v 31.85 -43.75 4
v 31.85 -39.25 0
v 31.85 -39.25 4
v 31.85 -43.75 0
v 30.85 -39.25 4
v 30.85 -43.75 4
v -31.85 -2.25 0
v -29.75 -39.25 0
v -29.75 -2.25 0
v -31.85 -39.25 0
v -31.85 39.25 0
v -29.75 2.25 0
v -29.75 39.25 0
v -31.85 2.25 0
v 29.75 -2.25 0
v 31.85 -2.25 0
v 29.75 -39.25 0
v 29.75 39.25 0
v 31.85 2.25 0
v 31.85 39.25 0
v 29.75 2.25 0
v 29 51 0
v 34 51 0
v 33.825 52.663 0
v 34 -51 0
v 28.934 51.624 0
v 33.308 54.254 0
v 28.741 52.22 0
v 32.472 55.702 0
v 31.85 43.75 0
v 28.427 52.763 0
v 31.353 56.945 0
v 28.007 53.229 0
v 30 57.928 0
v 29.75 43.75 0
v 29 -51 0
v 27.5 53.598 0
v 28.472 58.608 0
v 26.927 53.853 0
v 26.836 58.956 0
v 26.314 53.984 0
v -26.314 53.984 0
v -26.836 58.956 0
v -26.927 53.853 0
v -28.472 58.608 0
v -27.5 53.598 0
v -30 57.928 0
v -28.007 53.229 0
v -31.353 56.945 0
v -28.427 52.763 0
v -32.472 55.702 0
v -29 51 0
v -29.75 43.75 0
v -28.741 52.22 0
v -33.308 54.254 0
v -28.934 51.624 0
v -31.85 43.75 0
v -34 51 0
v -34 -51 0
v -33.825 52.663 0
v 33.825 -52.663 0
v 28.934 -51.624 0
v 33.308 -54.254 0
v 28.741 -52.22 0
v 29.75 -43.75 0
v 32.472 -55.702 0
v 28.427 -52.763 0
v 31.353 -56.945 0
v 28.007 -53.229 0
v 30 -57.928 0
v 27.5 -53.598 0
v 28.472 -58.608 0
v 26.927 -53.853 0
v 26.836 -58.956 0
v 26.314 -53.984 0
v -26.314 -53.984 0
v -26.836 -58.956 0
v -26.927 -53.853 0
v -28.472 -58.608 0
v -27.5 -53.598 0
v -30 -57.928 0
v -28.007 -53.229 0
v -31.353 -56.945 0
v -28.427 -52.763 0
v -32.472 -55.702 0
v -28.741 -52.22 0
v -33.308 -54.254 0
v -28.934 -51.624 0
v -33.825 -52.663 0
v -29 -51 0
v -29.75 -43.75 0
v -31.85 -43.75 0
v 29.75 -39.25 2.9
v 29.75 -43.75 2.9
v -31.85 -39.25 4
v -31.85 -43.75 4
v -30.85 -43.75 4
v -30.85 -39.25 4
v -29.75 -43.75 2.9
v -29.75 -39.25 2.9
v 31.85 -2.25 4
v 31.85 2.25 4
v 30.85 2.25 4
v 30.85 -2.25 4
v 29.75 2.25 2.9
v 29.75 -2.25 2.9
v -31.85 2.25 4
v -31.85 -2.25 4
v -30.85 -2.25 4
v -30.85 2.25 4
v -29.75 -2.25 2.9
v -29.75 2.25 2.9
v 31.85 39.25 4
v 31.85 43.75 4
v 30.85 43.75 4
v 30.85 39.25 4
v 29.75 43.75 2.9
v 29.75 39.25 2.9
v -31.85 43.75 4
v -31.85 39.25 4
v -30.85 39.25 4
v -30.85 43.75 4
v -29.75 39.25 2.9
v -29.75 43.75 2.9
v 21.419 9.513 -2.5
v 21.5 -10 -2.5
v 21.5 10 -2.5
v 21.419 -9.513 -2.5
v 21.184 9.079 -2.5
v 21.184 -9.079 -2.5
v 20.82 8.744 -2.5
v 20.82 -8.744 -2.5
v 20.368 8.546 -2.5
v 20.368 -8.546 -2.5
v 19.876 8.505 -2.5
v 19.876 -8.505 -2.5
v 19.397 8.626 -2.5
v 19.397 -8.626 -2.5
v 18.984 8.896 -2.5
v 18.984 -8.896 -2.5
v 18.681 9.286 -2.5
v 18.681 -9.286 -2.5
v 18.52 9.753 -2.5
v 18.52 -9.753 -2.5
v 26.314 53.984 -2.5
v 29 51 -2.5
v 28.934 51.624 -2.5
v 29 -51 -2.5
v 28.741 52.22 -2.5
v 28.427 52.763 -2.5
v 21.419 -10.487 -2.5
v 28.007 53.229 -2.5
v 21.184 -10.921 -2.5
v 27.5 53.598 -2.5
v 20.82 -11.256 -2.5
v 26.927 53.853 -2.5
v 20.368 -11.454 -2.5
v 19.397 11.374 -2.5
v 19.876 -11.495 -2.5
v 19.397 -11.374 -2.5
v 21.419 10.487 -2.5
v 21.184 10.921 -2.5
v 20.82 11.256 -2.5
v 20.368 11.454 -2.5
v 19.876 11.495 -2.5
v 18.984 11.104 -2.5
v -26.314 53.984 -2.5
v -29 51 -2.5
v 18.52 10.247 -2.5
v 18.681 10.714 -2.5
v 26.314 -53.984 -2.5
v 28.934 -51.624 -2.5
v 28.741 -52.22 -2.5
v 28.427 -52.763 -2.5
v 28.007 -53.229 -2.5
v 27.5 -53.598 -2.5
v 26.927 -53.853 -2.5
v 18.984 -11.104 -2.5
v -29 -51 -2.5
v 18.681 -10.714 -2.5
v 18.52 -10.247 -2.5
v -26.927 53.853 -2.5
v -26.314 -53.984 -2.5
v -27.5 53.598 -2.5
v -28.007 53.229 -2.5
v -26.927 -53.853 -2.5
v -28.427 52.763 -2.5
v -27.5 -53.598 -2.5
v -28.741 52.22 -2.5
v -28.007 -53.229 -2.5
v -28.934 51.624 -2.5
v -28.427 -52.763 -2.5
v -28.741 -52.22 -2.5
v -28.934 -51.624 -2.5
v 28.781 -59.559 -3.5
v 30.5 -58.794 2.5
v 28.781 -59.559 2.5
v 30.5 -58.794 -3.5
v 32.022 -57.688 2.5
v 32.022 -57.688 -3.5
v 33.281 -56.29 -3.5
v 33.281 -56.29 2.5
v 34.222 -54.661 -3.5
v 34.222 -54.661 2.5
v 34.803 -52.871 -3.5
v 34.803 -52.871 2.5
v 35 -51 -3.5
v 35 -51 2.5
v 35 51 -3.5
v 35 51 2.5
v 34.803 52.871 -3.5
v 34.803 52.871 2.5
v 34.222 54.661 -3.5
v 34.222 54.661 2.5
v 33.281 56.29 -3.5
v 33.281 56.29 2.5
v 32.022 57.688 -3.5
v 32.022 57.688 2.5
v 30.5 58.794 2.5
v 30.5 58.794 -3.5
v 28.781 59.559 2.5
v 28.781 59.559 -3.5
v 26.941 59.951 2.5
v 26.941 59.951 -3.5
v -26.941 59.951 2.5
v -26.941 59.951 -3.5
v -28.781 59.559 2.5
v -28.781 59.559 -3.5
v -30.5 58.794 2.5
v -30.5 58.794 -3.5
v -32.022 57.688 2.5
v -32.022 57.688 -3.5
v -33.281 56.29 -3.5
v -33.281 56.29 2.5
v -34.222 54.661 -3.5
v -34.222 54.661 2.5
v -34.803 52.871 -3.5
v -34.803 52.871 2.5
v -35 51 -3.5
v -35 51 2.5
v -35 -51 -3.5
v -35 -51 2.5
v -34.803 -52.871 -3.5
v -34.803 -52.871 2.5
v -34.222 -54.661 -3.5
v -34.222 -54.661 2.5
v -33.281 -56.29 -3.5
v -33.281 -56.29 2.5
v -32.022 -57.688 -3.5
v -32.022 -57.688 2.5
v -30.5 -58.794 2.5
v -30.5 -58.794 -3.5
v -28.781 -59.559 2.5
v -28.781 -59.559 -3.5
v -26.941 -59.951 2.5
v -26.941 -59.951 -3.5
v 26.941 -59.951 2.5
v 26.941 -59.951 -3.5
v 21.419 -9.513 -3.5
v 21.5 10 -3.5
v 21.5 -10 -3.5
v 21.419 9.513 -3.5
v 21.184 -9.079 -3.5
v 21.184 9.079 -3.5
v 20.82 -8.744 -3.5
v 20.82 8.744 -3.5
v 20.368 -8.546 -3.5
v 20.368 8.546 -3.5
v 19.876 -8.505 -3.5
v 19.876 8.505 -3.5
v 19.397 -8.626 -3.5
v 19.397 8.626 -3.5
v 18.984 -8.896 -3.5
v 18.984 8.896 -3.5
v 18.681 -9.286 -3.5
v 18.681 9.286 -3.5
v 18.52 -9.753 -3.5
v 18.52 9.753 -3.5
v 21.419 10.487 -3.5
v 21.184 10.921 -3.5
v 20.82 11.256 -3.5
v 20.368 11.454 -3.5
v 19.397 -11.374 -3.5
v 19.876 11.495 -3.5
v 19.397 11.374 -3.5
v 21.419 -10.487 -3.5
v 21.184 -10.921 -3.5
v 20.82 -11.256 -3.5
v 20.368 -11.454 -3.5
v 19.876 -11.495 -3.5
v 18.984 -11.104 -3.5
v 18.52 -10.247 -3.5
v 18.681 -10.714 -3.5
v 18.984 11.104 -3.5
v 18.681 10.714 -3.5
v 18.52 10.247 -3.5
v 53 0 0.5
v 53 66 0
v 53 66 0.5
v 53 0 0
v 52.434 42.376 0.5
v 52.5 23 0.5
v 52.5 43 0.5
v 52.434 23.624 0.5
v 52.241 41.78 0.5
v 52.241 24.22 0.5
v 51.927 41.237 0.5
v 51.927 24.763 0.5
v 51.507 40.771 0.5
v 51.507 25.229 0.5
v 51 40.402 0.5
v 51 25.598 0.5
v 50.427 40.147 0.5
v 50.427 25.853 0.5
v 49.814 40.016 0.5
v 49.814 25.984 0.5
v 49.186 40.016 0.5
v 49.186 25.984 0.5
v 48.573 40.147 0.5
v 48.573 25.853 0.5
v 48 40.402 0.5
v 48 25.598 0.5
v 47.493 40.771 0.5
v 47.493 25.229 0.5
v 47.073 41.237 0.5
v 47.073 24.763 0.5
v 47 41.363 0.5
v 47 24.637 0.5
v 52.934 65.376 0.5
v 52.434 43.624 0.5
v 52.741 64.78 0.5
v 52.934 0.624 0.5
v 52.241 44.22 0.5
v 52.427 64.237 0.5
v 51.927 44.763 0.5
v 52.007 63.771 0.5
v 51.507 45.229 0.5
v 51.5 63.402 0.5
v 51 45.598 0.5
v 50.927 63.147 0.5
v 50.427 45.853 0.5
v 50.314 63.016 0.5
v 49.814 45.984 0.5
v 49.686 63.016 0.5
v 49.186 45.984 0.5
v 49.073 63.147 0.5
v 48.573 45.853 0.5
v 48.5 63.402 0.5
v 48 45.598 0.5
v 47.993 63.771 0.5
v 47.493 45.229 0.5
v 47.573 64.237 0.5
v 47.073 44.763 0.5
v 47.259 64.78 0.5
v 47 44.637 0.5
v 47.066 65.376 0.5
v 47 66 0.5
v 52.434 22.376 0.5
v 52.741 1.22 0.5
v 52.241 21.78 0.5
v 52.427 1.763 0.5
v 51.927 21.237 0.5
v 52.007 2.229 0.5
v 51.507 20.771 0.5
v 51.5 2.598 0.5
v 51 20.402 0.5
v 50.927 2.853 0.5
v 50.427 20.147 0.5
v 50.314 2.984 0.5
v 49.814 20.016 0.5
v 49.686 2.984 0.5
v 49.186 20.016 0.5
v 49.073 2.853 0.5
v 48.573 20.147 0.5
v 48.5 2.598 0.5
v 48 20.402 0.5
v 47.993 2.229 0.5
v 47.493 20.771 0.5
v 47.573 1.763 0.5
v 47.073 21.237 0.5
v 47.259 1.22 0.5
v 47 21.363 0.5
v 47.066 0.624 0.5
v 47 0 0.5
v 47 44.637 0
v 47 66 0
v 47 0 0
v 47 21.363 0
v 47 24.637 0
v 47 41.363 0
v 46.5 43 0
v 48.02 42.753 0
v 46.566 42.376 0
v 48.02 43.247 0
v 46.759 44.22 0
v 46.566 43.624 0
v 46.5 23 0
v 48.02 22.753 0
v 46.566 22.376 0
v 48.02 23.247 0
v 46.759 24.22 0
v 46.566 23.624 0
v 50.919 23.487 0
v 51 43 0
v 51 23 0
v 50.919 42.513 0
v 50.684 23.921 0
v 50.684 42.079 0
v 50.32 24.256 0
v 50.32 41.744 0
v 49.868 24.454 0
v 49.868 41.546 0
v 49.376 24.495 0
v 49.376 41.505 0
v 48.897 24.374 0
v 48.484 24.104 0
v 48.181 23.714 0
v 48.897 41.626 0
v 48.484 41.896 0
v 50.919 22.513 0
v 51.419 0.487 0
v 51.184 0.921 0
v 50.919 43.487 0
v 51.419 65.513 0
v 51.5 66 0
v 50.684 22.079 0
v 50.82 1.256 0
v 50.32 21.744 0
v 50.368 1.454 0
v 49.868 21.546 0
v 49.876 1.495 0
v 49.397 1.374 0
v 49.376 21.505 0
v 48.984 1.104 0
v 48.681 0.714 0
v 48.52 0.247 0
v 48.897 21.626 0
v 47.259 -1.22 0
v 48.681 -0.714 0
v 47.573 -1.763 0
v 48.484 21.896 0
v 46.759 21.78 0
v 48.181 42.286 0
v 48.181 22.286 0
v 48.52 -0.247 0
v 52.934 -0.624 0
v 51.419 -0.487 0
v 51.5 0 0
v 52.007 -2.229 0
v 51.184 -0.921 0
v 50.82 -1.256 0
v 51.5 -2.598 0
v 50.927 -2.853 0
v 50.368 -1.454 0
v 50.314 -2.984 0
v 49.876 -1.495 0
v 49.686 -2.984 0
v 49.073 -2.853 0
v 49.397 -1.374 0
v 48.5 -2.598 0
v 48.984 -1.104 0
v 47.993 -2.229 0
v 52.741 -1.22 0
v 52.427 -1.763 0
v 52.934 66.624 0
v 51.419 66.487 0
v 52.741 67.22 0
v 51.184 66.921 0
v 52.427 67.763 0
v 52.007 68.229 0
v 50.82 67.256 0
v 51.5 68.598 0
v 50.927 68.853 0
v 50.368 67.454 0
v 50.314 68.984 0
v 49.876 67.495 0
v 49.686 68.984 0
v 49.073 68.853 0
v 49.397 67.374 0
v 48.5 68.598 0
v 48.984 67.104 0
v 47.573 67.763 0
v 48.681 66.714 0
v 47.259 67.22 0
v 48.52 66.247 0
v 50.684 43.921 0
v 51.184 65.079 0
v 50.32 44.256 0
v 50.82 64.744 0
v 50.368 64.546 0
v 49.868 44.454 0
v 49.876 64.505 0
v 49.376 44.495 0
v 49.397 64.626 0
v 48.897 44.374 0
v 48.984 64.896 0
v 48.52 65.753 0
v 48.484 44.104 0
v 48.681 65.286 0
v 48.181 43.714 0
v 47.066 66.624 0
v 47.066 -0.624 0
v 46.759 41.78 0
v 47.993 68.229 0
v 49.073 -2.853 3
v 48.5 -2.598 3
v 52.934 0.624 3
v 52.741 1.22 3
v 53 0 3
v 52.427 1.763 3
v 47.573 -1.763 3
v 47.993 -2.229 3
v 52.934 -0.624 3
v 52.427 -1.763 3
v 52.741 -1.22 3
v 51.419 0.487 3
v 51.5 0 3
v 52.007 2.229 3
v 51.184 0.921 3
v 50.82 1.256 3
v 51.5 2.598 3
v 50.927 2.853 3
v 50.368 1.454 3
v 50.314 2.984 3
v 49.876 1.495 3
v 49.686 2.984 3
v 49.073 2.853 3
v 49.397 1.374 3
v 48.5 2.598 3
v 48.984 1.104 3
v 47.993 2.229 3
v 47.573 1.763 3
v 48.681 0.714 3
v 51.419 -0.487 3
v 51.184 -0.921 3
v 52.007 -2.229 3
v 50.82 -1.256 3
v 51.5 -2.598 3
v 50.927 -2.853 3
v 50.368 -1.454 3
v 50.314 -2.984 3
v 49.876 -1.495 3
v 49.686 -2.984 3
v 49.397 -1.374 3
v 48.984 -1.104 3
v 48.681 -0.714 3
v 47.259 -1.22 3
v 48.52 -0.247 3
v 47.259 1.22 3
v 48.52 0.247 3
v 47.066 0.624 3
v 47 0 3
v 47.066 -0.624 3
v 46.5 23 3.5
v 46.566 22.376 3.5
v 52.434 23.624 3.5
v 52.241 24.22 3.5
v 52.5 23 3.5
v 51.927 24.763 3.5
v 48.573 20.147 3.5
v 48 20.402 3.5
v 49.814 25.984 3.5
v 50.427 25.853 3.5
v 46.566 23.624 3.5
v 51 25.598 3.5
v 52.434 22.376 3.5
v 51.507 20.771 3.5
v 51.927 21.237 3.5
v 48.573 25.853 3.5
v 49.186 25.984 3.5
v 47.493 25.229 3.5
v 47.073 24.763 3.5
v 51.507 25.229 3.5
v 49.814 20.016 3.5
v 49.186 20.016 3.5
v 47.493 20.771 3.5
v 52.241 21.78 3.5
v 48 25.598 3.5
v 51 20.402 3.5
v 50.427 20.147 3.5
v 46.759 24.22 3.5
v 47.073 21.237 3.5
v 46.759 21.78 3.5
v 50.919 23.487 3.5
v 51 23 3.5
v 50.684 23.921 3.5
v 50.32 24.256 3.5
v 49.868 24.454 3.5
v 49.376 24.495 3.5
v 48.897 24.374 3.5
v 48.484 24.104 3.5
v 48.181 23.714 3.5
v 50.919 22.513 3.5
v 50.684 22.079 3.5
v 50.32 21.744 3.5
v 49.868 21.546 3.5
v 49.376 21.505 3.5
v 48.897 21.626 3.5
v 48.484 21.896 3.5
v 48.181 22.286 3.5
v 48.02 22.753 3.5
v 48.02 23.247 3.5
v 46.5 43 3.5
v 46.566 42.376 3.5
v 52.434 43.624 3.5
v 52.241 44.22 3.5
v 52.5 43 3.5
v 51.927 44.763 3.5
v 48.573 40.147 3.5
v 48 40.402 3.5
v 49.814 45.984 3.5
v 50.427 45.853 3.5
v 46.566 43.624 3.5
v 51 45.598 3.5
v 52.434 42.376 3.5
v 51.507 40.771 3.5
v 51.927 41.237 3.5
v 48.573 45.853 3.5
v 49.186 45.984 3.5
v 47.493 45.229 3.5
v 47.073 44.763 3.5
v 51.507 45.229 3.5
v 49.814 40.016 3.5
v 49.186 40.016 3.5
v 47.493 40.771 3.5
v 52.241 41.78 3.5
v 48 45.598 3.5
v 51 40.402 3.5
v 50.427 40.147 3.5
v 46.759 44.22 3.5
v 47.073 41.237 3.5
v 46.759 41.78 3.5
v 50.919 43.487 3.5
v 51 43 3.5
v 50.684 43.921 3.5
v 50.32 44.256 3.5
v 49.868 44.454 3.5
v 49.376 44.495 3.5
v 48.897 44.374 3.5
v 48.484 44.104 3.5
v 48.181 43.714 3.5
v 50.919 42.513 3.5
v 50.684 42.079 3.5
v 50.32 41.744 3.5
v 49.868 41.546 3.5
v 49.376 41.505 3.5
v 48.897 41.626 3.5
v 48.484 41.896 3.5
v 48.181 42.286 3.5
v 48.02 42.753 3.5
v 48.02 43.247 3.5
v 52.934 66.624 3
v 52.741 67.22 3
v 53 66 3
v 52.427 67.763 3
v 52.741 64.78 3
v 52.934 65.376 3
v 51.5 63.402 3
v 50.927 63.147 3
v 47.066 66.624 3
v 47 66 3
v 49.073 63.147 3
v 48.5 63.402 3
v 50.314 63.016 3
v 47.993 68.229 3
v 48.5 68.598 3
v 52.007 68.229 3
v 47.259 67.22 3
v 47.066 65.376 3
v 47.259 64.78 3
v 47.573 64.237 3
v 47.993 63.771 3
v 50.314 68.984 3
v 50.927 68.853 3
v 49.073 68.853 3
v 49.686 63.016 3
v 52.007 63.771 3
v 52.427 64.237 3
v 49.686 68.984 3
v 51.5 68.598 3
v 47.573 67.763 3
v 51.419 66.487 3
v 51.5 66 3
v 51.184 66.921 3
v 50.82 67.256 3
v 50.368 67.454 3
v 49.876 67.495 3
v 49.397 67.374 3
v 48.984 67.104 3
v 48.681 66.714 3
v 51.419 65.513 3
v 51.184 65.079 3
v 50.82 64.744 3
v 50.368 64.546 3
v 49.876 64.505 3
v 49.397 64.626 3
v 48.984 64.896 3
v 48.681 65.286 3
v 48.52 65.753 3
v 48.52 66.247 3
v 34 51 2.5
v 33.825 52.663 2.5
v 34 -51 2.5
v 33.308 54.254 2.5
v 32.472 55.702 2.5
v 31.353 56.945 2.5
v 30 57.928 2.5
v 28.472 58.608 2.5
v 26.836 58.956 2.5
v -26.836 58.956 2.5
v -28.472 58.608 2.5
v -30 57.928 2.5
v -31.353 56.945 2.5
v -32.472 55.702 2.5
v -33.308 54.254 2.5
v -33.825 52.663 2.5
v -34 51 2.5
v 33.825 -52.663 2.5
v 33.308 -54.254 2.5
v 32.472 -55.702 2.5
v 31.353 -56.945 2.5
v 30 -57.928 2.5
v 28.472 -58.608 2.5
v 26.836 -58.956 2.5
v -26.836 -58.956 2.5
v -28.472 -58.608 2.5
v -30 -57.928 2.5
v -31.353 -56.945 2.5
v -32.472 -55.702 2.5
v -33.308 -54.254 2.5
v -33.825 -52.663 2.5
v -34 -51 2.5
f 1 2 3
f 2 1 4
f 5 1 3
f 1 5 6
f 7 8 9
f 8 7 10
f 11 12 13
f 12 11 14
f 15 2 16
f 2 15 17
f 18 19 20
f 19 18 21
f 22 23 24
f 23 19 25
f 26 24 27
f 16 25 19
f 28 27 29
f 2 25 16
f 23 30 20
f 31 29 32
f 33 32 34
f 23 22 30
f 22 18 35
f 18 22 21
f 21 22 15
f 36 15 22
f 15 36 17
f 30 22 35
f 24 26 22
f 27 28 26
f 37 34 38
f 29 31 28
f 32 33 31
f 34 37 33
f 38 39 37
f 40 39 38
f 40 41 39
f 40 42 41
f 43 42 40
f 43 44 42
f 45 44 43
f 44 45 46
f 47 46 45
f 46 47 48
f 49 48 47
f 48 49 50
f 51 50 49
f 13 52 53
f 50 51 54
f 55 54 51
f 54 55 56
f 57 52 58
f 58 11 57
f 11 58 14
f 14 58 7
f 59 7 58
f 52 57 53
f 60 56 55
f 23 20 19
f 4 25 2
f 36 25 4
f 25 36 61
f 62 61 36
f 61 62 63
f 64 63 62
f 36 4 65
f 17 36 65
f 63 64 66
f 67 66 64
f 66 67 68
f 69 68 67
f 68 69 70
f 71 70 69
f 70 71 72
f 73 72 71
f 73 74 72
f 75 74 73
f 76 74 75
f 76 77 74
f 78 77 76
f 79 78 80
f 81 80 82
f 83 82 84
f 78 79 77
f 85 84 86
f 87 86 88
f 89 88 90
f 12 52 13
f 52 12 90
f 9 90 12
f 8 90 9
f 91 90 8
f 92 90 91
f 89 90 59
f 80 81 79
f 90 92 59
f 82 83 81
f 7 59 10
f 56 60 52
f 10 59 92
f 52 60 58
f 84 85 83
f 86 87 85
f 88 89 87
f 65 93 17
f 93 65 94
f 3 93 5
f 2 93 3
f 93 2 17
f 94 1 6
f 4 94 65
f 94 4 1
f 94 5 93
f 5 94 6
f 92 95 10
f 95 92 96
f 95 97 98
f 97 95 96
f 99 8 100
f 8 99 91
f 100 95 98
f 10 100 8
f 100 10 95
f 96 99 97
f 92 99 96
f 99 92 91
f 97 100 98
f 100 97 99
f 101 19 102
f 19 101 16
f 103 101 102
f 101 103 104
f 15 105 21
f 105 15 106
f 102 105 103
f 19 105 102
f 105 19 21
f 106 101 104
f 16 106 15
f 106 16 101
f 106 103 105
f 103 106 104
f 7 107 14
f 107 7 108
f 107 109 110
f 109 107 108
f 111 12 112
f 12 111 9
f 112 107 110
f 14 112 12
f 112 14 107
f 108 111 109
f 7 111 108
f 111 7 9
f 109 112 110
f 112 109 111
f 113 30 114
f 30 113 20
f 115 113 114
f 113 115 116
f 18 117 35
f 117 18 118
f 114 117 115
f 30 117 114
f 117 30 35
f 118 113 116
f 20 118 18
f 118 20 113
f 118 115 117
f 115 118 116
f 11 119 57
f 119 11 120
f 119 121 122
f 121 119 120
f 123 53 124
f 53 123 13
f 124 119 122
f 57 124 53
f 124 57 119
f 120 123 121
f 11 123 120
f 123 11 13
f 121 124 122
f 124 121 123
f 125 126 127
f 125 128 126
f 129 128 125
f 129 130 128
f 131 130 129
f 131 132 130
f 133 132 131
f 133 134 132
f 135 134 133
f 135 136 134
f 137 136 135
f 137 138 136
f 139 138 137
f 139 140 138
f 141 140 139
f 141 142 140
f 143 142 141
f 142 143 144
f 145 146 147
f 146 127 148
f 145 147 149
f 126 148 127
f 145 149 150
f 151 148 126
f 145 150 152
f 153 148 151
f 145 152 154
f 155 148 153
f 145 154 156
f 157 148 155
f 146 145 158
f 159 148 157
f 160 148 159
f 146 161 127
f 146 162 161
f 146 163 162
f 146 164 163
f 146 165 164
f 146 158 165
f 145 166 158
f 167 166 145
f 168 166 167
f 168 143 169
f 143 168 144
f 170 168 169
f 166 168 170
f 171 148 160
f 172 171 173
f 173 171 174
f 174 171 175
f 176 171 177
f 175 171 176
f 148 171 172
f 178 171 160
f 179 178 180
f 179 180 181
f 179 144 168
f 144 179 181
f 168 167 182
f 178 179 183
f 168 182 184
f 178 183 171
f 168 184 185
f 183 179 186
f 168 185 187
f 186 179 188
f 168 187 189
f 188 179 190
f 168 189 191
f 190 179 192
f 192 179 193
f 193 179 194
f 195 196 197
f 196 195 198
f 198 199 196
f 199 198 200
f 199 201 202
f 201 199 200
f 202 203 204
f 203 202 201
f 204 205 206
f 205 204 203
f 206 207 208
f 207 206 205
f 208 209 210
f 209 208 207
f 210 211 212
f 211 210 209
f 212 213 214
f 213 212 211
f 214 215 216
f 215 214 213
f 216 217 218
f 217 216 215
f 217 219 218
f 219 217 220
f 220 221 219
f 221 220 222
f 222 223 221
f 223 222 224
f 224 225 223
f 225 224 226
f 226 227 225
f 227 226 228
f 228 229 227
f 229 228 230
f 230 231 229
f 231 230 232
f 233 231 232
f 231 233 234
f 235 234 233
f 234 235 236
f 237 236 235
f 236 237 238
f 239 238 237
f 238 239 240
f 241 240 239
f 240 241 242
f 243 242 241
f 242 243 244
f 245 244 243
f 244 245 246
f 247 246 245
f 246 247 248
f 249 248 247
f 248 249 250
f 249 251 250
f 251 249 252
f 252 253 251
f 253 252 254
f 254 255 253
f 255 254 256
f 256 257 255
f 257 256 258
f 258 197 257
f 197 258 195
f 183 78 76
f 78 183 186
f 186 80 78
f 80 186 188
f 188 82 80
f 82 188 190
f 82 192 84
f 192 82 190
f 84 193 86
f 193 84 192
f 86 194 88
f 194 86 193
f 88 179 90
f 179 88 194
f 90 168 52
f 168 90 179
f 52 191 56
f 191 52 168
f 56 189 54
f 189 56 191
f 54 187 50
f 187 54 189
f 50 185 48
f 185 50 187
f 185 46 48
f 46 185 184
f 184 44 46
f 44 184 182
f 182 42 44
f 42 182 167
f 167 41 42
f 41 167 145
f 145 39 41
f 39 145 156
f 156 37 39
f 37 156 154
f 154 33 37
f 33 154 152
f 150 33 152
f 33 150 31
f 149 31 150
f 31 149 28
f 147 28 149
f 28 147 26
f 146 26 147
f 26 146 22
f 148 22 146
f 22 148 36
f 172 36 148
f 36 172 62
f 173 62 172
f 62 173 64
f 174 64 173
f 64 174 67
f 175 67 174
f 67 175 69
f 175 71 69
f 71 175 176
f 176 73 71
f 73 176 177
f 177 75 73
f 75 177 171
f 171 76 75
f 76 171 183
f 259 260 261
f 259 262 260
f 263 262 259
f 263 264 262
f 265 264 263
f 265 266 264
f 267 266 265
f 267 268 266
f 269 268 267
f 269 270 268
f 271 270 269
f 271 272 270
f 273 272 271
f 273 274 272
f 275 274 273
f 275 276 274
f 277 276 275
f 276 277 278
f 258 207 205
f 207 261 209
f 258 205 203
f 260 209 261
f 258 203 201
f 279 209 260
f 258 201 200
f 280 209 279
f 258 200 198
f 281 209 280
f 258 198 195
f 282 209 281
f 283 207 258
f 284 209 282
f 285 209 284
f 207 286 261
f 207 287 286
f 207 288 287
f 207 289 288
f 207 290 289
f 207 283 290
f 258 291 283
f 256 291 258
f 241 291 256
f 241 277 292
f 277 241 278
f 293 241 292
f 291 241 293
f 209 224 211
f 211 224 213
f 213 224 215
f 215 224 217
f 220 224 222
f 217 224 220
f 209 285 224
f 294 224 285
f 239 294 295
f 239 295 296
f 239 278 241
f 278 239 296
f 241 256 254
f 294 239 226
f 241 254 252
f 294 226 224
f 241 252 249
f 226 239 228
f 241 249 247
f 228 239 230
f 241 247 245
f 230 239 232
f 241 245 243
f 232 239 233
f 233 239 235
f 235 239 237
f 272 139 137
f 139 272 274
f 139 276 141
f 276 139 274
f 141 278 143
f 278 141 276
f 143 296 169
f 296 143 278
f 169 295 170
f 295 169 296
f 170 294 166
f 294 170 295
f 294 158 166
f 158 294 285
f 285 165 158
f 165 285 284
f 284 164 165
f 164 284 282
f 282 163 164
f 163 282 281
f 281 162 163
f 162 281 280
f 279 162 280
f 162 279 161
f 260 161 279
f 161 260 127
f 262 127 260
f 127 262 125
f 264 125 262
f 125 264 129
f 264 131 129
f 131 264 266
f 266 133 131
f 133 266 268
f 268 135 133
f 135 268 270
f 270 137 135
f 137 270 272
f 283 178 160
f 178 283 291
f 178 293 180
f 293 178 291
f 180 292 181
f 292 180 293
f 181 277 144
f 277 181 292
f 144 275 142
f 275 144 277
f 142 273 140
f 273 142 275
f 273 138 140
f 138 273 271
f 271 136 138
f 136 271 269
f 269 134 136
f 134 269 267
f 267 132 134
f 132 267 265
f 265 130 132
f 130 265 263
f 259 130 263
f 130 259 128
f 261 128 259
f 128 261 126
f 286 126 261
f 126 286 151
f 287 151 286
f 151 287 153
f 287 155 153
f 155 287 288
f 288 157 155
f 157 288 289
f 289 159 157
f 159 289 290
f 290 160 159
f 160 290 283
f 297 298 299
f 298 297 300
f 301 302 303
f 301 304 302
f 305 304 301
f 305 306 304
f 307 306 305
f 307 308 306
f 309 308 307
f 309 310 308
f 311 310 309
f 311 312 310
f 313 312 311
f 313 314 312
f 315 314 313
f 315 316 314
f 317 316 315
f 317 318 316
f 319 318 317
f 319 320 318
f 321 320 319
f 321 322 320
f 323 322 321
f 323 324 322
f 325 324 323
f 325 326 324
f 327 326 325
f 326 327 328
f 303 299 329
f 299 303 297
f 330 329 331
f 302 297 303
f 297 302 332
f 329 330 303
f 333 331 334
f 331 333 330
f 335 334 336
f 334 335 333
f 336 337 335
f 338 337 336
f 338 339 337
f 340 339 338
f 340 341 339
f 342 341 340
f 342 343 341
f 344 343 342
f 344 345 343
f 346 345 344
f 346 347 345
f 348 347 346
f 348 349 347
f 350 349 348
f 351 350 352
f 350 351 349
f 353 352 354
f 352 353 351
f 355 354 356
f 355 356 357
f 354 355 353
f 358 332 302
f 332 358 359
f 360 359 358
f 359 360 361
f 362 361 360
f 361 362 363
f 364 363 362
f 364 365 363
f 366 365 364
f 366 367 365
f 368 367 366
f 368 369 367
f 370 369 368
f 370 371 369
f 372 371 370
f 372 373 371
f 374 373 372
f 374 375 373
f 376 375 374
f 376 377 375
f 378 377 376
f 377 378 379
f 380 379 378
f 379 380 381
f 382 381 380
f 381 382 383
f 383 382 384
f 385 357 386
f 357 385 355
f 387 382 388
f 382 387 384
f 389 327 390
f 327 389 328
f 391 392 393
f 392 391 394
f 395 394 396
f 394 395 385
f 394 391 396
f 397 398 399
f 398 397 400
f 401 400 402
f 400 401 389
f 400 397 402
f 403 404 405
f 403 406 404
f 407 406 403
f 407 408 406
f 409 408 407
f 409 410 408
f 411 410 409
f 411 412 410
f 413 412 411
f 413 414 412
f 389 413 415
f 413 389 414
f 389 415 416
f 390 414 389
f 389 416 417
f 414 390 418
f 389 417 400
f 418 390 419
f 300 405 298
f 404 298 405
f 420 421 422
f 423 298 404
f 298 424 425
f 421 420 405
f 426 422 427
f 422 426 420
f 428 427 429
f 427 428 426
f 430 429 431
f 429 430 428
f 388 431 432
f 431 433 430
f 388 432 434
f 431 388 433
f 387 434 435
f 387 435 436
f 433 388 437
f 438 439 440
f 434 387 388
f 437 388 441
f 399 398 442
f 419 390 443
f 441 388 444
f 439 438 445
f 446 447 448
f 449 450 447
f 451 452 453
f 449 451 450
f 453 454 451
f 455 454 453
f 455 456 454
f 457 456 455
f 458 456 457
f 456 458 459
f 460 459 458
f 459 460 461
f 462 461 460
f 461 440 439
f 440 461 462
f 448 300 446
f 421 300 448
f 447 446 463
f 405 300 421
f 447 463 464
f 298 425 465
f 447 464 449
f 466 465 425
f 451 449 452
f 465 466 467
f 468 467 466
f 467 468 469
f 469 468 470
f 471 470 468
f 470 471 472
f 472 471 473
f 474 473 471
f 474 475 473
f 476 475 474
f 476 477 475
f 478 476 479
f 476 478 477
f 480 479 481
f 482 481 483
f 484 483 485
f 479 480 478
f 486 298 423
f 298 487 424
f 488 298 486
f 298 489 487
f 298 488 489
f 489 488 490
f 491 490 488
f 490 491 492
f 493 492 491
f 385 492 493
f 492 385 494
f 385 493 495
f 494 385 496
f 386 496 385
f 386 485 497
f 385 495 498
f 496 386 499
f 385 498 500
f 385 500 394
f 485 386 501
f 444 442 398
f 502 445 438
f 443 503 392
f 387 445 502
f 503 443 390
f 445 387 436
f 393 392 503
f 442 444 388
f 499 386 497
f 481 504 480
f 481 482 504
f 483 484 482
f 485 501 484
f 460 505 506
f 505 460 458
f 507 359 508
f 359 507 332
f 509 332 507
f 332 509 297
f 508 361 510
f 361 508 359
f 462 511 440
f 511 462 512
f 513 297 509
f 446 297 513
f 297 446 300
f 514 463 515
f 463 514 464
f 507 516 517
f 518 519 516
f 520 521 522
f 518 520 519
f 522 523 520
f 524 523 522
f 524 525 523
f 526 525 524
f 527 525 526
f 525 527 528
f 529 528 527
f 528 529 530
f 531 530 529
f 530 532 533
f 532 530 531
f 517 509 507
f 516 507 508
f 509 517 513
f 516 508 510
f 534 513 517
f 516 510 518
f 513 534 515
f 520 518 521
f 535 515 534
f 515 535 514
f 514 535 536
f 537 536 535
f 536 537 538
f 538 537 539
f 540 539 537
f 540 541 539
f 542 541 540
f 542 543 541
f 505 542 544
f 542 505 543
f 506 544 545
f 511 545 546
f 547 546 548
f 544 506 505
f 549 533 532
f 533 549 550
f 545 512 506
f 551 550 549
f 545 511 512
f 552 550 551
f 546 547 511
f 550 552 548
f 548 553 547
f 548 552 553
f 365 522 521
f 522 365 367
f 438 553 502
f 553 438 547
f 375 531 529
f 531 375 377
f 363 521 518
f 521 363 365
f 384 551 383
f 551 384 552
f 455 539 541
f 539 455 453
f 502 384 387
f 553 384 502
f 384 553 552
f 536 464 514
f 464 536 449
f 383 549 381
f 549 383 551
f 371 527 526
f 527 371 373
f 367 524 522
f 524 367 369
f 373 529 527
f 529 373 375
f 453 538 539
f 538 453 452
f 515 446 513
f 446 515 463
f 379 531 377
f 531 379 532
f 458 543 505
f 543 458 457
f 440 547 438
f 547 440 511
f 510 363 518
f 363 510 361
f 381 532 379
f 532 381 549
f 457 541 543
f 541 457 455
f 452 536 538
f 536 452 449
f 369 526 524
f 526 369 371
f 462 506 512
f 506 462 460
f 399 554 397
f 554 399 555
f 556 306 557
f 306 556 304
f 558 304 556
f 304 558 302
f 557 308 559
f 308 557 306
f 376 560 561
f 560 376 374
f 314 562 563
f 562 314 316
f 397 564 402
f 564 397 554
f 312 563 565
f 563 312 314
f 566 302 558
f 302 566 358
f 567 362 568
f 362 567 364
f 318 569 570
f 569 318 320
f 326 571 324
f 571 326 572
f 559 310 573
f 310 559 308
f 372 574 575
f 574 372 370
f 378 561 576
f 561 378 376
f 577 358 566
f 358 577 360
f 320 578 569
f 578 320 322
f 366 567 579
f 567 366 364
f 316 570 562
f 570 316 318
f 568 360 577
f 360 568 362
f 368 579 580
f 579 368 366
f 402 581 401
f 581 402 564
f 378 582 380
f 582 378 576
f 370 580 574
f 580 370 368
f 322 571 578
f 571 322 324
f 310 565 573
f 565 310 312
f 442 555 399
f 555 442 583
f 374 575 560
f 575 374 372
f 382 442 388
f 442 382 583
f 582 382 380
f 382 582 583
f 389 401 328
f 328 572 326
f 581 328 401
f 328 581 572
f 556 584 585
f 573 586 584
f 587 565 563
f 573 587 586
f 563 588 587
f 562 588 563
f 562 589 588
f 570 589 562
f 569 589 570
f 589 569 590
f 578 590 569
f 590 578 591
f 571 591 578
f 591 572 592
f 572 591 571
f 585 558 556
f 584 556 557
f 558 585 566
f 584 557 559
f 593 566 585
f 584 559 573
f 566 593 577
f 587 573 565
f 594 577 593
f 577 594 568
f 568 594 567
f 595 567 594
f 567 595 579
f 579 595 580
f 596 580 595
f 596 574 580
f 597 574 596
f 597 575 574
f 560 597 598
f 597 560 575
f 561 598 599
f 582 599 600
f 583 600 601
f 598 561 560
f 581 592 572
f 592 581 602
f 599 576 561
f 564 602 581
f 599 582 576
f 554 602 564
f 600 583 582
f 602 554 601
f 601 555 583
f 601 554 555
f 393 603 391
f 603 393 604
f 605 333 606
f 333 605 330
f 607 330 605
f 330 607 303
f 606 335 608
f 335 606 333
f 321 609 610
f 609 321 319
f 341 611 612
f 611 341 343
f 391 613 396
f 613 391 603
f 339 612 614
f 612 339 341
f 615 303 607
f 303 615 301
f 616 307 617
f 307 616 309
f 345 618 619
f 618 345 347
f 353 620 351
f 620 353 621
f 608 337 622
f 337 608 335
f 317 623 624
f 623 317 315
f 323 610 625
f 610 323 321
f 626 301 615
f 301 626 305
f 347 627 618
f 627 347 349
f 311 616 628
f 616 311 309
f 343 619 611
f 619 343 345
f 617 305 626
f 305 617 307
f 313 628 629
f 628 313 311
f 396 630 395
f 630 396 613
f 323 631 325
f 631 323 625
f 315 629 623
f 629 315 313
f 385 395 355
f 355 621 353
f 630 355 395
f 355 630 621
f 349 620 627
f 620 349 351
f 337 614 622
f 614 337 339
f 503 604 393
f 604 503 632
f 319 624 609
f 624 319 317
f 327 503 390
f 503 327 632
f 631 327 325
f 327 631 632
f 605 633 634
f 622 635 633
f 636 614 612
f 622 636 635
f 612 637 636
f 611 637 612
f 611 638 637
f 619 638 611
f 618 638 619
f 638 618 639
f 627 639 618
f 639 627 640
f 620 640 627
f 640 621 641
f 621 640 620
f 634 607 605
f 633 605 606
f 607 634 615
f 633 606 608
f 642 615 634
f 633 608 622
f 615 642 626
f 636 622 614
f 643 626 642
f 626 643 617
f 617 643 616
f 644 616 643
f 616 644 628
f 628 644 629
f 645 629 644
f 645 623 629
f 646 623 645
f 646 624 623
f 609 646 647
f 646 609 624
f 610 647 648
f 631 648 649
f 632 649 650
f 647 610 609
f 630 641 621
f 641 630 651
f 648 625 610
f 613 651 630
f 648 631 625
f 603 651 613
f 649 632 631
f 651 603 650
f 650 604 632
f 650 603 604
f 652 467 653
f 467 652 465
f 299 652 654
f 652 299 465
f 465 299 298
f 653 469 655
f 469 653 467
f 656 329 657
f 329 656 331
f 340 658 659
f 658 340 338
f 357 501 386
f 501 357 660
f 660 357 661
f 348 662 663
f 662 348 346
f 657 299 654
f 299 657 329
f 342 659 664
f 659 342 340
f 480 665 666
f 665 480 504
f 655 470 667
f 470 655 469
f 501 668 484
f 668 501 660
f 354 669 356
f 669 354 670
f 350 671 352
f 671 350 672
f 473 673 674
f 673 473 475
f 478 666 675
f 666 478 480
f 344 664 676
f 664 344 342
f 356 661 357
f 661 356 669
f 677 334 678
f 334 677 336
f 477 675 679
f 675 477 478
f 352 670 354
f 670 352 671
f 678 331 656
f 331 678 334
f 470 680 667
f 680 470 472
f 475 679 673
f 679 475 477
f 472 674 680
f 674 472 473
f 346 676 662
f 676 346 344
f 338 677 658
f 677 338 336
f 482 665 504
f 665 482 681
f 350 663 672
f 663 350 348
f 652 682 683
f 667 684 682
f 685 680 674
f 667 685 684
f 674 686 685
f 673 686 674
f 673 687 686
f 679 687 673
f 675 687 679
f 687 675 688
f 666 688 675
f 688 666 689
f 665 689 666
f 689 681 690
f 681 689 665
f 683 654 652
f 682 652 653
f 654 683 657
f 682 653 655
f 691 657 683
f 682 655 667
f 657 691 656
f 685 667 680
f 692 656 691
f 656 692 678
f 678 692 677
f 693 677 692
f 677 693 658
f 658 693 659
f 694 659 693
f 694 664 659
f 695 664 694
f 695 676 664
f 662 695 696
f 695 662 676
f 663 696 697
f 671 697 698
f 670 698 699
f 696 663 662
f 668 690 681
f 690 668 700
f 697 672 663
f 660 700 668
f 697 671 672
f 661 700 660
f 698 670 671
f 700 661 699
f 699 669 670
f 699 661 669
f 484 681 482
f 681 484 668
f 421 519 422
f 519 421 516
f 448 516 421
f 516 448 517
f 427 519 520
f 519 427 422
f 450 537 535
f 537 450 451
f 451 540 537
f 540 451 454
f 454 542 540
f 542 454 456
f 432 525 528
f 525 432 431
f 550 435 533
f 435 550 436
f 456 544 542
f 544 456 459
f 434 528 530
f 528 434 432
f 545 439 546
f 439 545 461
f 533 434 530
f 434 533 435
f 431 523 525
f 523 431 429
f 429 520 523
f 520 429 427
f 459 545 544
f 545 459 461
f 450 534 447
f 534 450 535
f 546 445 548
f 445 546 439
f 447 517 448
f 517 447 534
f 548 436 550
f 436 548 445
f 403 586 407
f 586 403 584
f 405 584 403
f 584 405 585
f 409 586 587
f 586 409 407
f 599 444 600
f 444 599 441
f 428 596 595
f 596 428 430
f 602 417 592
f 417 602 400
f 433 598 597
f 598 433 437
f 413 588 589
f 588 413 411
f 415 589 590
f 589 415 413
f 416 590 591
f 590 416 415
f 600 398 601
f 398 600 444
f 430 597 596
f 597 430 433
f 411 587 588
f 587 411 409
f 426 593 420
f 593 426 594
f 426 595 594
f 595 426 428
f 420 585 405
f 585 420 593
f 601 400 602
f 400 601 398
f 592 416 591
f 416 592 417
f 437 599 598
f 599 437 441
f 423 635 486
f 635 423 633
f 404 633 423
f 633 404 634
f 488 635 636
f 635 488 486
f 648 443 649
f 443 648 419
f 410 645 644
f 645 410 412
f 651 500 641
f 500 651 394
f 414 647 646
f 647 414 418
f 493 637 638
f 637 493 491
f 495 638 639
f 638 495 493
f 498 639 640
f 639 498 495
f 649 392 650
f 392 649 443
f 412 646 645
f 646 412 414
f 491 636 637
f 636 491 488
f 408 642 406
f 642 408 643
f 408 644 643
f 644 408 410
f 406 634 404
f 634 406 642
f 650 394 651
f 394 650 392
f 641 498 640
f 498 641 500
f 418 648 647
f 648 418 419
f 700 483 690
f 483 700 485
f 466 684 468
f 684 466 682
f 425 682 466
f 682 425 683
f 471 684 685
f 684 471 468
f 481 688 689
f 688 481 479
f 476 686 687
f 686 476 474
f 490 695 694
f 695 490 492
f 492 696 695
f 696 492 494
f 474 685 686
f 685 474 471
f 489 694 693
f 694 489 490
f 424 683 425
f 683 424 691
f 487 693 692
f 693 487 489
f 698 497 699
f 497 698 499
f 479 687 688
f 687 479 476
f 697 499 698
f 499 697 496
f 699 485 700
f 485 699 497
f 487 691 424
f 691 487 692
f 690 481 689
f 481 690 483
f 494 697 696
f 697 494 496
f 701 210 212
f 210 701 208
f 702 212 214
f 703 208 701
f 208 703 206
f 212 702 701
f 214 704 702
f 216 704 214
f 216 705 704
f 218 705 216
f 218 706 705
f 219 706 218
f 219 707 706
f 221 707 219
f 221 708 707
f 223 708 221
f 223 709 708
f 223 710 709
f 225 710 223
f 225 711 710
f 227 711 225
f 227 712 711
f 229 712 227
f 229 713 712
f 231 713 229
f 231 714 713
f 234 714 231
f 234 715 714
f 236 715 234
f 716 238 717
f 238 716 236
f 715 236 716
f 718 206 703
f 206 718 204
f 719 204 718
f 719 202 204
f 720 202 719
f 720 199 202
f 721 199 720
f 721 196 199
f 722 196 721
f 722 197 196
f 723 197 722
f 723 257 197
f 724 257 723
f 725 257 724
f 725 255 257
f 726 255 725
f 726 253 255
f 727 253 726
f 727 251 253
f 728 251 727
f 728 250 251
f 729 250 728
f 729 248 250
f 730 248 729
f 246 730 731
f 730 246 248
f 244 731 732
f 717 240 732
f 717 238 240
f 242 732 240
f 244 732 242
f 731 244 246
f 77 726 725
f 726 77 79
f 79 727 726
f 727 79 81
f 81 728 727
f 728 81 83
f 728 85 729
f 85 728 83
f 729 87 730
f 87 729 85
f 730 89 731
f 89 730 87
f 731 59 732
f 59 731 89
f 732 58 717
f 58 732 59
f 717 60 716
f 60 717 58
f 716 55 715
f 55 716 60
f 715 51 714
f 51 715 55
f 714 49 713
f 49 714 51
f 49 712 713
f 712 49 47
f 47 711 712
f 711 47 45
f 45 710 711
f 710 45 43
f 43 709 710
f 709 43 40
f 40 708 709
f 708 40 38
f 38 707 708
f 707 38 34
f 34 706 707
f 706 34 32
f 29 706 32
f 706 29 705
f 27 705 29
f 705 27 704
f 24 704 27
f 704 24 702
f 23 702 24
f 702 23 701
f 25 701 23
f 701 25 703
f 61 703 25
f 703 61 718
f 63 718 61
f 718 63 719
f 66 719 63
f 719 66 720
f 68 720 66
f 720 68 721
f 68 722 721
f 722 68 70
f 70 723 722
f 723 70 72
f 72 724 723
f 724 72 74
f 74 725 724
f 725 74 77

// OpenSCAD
$fs=.5;

module rsq(wh,r){
	minkowski(){square([wh[0]-r*2,wh[1]-r*2],center=true);circle(r);}
}

module tume(){
	translate([59.5/2,-4.5/2,0])difference(){
		cube([2.1,4.5,4]);
		translate([1.1,(4.5-5)/2,4])rotate([0,-90-45,0])cube([2,5,4]);
	}
}

linear_extrude(2.5)difference(){
	rsq([70,120],9);
	rsq([70-2,120-2],9-1);
}
for(i=[-1:1])translate([0,i*41.5,0]){
	tume();scale([-1,1,1])tume();
}
translate([0,0,-2.5]){
	linear_extrude(2.5)difference(){
		rsq([70,120],9);
		rsq([70-12,120-12],9-6);
	}
	translate([0,0,-1]){
		linear_extrude(1)difference(){
			rsq([70,120],9);
			//square([43.5,92],center=true);
			for(i=[-1,1])translate([20, 10*i,0])circle(d=3);
		}
	}
}


translate([50,0,0])difference(){
	union(){
		linear_extrude(.5)minkowski(){square([1e-9,66]);circle(d=6);}
		cylinder(d=6,h=3);
		translate([-.5,23,0])cylinder(d=6,h=3.5);
		translate([-.5,43,0])cylinder(d=6,h=3.5);
		translate([0,66,0])cylinder(d=6,h=3);
	}
	cylinder(d=3,h=5);
	translate([-.5,23,0])cylinder(d=3,h=5);
	translate([-.5,43,0])cylinder(d=3,h=5);
	translate([0,66,0])cylinder(d=3,h=5);
}
